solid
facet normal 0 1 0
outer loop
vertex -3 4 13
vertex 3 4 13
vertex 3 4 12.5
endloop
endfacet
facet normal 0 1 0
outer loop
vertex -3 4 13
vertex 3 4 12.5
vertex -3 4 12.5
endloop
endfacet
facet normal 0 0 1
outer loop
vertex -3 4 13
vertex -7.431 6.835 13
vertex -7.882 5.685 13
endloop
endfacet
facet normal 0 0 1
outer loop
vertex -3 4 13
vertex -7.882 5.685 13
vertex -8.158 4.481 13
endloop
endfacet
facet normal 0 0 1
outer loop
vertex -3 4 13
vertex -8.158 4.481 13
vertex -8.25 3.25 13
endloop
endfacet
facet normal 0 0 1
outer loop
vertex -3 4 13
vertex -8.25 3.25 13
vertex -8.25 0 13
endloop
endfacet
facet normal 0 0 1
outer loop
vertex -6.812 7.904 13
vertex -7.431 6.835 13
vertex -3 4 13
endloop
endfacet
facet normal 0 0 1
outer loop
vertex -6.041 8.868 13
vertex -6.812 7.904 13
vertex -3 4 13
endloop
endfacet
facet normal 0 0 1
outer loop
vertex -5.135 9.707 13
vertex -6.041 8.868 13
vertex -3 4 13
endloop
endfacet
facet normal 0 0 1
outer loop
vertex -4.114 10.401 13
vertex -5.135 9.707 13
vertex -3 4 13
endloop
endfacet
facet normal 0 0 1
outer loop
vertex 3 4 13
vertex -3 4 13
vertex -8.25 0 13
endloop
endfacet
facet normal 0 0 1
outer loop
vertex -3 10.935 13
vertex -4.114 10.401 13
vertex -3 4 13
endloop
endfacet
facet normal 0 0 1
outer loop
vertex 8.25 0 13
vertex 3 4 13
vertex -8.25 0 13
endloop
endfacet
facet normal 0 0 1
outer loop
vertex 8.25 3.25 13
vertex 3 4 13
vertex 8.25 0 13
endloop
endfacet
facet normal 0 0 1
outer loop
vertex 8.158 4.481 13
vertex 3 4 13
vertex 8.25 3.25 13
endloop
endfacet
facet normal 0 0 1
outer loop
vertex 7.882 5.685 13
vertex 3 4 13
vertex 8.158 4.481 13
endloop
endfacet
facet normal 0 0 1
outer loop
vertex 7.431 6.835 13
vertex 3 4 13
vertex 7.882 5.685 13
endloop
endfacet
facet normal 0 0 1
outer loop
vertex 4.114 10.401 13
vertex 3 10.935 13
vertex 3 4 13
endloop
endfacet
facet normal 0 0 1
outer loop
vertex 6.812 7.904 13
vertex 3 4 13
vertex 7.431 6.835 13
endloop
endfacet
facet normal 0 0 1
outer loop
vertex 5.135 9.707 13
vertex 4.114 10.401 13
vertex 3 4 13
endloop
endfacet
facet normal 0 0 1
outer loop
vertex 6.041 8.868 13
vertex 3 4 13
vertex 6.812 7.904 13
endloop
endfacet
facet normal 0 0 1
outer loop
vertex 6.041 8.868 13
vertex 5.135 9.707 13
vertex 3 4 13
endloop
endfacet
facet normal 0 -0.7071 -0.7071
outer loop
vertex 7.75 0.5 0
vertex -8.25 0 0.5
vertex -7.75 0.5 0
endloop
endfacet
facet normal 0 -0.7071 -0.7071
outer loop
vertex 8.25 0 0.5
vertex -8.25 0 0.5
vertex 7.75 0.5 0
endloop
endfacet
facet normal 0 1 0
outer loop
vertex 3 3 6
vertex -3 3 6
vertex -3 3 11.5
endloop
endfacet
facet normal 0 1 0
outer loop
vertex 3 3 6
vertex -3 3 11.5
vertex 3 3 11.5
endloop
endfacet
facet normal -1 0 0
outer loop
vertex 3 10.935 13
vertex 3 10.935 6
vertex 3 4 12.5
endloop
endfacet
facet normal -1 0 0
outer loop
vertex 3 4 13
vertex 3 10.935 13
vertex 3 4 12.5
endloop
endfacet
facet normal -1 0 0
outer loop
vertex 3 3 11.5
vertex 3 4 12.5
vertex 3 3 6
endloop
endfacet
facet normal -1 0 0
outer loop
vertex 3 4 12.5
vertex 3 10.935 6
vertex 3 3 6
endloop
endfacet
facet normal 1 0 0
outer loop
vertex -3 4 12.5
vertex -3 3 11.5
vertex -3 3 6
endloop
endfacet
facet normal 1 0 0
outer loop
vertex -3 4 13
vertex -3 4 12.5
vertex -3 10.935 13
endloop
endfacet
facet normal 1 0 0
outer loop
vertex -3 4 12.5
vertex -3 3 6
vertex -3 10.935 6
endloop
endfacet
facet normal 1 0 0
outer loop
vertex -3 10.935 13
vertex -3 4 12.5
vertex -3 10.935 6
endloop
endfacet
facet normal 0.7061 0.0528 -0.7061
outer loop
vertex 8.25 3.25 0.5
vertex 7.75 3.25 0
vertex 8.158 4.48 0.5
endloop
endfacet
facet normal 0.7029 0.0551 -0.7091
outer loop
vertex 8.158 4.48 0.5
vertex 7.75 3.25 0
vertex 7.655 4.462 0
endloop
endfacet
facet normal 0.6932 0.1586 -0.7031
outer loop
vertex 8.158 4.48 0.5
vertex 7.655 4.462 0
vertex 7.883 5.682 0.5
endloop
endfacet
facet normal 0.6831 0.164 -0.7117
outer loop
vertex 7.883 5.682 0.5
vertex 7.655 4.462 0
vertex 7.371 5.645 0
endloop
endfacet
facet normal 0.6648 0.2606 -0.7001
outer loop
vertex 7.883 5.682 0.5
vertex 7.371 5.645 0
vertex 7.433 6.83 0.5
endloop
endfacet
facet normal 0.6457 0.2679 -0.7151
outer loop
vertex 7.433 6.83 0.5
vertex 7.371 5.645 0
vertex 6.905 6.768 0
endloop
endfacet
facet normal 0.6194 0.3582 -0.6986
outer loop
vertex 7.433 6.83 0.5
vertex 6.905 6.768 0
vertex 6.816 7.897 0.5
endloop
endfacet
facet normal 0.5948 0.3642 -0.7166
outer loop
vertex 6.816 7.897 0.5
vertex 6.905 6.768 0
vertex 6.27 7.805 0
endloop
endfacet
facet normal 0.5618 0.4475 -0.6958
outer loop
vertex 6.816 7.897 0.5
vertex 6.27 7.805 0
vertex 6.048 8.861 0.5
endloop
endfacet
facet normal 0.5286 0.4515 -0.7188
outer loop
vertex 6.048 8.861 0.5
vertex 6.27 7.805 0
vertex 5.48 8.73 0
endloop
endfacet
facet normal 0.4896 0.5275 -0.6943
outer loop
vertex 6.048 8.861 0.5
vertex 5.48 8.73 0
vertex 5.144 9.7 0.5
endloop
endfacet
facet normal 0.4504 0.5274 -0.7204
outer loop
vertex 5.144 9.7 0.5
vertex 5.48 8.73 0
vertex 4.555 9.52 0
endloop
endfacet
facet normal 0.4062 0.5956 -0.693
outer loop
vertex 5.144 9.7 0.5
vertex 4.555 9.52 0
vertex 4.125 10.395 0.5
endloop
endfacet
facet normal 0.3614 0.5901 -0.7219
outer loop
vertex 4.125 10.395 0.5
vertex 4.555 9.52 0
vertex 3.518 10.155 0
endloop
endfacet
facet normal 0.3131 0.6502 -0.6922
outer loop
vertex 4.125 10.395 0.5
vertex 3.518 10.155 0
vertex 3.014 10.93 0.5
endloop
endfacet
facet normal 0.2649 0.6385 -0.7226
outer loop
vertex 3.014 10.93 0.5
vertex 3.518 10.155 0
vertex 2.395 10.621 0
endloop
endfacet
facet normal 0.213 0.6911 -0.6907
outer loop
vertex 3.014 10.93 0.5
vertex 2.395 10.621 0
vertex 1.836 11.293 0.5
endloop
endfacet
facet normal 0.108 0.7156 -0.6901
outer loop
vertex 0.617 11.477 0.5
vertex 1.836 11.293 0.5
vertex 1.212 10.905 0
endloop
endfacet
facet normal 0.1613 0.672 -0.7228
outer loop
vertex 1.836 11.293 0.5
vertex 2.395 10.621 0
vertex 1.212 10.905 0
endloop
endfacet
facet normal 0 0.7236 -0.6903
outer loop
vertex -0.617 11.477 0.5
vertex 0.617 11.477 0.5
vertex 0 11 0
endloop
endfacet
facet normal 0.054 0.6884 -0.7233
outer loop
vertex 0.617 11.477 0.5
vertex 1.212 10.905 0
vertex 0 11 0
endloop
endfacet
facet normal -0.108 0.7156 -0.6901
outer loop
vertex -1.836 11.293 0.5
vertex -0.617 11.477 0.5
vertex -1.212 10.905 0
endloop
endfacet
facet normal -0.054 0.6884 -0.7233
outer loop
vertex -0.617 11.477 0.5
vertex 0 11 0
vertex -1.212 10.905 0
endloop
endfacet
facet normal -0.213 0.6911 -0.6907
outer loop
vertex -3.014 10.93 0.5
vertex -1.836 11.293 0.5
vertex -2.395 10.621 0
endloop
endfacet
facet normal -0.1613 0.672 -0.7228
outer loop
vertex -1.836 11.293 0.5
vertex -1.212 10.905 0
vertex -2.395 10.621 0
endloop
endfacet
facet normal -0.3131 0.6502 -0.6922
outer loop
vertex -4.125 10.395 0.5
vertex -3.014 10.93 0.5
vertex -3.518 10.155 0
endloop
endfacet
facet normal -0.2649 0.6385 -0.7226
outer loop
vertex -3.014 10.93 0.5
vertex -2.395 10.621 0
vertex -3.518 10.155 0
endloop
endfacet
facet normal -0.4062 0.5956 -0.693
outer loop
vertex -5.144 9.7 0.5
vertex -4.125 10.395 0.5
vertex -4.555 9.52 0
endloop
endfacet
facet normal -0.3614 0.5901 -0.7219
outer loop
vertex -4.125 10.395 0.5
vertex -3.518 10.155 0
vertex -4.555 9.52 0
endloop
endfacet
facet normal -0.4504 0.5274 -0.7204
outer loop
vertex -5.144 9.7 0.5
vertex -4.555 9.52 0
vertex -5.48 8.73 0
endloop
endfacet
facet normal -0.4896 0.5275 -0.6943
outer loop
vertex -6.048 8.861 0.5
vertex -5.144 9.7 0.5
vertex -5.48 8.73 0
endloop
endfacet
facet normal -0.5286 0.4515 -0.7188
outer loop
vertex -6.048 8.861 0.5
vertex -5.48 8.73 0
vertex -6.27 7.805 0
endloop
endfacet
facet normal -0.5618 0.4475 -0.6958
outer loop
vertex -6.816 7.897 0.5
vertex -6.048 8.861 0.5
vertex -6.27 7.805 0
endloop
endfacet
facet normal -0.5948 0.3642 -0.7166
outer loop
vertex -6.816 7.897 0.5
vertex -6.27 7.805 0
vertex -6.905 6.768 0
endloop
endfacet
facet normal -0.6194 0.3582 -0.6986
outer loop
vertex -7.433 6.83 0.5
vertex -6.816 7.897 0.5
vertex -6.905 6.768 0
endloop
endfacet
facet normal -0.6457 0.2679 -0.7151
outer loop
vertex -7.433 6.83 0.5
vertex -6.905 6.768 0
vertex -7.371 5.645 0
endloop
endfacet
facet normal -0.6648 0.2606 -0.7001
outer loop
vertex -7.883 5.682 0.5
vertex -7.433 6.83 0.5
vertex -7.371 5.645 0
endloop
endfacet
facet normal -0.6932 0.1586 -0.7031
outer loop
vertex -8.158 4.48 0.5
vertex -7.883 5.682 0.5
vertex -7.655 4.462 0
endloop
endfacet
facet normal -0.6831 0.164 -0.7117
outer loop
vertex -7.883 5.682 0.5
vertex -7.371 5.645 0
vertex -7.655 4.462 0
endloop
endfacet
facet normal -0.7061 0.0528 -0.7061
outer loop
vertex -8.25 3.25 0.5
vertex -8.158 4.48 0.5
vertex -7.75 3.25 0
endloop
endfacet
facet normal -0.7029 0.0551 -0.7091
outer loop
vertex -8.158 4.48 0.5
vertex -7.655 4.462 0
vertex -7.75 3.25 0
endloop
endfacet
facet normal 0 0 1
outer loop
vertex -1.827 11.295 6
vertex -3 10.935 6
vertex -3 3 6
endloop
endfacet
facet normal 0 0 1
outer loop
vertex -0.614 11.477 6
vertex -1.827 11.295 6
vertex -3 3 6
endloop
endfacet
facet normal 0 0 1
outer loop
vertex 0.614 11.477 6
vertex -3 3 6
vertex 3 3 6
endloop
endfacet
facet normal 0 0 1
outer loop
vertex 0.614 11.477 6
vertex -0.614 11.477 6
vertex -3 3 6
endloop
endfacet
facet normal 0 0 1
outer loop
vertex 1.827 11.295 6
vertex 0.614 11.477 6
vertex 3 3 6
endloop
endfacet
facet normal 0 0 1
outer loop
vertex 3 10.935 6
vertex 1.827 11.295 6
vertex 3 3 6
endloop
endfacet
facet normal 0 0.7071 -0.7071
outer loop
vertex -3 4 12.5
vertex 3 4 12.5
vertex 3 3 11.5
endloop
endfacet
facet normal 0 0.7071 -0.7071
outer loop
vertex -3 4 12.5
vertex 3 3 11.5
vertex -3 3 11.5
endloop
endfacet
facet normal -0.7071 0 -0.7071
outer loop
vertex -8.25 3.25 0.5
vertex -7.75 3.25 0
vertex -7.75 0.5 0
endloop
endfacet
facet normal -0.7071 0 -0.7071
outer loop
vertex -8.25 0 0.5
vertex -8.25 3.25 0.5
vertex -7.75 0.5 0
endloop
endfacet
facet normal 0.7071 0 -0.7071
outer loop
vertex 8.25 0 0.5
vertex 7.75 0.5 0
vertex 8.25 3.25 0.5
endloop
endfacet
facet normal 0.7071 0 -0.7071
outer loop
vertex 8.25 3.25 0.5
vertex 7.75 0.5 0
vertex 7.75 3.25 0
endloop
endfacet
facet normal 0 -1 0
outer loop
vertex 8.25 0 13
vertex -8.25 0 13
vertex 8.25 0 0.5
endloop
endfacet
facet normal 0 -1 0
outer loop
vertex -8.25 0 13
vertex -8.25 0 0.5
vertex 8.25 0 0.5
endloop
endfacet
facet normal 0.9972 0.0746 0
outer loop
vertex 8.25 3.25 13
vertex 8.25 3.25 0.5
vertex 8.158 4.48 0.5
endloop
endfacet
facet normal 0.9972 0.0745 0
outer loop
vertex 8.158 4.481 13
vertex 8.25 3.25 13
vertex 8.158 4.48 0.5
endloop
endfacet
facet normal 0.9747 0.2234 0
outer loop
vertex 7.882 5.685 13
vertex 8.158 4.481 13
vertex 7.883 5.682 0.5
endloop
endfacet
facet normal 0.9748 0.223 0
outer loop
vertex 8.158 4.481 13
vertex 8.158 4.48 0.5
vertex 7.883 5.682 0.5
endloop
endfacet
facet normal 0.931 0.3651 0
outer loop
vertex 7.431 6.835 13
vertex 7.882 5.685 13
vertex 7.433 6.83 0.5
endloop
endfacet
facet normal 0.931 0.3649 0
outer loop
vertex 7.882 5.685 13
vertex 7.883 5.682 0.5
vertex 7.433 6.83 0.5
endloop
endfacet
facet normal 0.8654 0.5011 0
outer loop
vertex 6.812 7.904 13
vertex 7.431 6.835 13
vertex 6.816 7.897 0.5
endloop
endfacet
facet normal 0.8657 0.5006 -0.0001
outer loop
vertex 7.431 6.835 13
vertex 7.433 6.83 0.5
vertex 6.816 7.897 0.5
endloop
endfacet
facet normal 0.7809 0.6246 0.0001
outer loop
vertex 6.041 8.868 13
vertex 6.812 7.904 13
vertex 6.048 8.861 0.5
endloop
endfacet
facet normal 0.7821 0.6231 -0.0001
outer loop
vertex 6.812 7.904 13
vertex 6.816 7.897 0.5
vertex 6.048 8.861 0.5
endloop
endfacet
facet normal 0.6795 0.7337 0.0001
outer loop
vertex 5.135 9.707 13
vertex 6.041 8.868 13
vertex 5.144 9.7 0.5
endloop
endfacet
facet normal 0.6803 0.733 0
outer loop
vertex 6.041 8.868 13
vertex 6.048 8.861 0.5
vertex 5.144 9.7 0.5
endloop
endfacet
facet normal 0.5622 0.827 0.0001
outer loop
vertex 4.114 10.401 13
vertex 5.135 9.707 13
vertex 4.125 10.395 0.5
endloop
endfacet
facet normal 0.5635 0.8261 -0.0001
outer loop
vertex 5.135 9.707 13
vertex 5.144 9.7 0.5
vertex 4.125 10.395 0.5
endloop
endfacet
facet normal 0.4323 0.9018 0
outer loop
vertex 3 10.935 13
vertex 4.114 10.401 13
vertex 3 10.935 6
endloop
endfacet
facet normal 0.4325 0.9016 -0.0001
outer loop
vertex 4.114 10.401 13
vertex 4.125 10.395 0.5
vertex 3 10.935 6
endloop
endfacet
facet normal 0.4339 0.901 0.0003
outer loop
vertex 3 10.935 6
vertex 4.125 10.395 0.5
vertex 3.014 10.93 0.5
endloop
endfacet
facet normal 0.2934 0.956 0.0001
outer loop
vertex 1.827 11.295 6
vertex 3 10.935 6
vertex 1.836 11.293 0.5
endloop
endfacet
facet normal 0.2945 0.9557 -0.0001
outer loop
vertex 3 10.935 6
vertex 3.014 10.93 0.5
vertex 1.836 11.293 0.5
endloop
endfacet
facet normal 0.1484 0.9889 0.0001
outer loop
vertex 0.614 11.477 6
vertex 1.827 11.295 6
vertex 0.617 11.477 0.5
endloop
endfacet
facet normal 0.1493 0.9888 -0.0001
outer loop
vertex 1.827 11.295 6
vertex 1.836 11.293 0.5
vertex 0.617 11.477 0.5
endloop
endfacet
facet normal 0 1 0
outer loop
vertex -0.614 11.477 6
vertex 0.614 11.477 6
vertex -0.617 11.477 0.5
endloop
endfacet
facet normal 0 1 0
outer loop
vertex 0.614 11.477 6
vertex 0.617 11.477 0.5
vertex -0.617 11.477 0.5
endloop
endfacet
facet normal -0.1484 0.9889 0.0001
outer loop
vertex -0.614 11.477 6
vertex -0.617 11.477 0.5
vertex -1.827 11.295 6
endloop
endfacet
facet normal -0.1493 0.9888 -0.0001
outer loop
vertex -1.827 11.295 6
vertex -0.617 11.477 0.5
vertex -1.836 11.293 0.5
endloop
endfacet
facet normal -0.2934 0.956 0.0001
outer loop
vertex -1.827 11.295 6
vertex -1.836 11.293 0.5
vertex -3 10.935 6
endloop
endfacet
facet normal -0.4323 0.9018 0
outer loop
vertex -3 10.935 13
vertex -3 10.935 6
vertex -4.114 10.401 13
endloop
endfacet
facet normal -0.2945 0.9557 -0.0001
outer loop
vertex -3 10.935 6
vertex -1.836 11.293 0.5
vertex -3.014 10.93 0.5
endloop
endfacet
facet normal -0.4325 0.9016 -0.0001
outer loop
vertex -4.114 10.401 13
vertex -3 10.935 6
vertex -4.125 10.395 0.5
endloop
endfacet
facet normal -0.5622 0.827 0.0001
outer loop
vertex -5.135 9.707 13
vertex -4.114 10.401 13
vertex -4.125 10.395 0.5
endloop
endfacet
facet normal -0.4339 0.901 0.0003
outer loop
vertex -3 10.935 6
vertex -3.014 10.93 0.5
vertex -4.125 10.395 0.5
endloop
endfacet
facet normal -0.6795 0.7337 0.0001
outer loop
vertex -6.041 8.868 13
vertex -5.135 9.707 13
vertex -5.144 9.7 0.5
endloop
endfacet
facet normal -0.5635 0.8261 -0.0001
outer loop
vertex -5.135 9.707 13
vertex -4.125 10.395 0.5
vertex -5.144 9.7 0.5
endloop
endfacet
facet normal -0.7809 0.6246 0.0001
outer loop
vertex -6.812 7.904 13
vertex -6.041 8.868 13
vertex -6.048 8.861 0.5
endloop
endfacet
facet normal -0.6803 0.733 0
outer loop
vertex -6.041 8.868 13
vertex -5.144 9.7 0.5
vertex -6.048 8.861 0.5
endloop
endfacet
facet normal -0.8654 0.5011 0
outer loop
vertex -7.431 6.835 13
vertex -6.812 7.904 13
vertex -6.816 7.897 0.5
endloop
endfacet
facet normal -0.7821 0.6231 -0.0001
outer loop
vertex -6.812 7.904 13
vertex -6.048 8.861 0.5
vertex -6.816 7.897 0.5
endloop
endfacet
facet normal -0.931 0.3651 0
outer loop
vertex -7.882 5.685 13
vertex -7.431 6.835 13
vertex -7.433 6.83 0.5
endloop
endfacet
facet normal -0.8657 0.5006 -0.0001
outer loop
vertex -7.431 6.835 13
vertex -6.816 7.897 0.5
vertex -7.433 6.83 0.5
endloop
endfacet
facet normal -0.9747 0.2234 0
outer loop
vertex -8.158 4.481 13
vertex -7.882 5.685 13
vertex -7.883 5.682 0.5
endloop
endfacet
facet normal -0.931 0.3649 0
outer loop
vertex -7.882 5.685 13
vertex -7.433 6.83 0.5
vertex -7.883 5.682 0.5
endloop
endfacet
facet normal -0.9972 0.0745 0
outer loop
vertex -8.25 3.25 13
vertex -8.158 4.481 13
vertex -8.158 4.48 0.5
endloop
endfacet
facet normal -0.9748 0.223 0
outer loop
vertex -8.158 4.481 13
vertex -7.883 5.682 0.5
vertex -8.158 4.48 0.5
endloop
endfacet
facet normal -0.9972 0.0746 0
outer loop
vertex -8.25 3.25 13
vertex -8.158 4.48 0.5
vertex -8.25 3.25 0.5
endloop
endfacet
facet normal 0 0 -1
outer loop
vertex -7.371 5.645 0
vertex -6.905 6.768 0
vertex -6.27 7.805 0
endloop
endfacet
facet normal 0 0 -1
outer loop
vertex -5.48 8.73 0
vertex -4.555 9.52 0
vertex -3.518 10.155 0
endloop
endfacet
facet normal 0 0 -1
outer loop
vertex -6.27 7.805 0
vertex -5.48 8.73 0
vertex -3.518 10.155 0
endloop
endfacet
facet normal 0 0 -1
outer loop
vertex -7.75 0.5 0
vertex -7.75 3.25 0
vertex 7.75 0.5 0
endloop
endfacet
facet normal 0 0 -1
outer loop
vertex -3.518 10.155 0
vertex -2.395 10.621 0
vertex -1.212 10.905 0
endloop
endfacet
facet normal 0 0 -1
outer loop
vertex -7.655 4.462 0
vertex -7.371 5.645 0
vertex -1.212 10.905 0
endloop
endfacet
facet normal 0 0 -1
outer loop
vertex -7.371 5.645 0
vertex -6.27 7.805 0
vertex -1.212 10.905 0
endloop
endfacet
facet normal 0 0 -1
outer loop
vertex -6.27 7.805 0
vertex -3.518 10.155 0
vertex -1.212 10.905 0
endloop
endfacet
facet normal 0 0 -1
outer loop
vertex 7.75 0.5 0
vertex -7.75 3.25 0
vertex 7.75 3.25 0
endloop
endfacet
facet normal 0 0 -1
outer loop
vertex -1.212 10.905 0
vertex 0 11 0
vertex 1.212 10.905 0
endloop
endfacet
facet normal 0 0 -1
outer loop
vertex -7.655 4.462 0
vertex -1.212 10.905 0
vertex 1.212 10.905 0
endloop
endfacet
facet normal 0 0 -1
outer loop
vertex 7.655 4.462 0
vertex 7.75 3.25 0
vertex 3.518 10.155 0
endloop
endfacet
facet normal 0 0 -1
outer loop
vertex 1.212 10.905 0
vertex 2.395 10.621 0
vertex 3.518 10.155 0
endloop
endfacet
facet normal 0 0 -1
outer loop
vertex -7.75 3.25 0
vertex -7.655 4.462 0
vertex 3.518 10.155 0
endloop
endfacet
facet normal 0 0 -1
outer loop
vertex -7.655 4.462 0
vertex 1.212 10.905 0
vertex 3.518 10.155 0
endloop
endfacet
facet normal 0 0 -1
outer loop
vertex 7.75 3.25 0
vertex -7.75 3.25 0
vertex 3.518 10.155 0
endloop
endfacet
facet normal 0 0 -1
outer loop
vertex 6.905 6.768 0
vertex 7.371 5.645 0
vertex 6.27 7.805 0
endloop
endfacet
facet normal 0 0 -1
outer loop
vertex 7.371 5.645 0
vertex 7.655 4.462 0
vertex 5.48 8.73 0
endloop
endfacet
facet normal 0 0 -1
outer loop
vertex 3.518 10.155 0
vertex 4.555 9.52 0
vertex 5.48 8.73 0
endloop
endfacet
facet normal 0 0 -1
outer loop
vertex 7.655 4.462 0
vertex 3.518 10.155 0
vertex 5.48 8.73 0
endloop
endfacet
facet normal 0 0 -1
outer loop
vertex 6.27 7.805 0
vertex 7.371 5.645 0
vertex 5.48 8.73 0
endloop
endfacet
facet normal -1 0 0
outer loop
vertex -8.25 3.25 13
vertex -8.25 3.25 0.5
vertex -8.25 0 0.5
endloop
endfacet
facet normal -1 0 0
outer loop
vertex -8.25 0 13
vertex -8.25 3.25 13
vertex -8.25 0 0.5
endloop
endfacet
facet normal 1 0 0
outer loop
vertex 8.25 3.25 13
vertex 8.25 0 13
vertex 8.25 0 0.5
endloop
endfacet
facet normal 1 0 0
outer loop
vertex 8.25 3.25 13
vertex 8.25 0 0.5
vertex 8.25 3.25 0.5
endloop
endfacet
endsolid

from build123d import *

# Parameters (mm, degrees)
F4_DEPTH  = 1
F6_DEPTH  = 12
F7_SIZE   = 0.5
F8_W      = 6
F8_H      = 3
F9_DEPTH  = 12
F10_DEPTH = 5
F11_W     = 6
F11_H     = 1.5
F12_DEPTH = 1
F13_SIZE  = 0.99999


# Not quite as in the source:
# - a fillet or chamfer is up to 0.001 mm smaller than in the source, because OpenCascade refuses the exact size


with BuildPart() as f4:
    # F3 (on Top) → F4 (new body)
    with BuildSketch(Plane.XY):
        with BuildLine():
            Line((-8.25, 0), (0, 0))
            Line((0, 0), (8.25, 0))
            Line((8.25, 0), (8.25, 3.25))
            ThreePointArc((8.25, 3.25), (0, 11.5), (-8.25, 3.25))
            Line((-8.25, 3.25), (-8.25, 0))
        make_face()
    extrude(amount=F4_DEPTH)

    # F5 (on face) → F6 (join)
    with BuildSketch(Plane.XY.offset(1)):
        with BuildLine():
            Line((-3, 0), (-3, 10.9352130745))
            ThreePointArc((-3, 10.9352130745), (-6.8122132967, 7.9036276172), (-8.25, 3.25))
            Line((-8.25, 3.25), (-8.25, 0))
            Line((-8.25, 0), (-3, 0))
        make_face()
        with BuildLine():
            ThreePointArc((8.25, 3.25), (6.8122132967, 7.9036276172), (3, 10.9352130745))
            Line((3, 10.9352130745), (3, 0))
            Line((3, 0), (8.25, 0))
            Line((8.25, 0), (8.25, 3.25))
        make_face()
    extrude(amount=F6_DEPTH)

    # F7
    f7_edges = [f4.edges().sort_by_distance(p)[0] for p in [
        (8.25, 1.625, 0),
        (0, 0, 0),
    ]]
    chamfer(f7_edges, length=F7_SIZE)

    # F8 (on face) → F9 (join)
    with BuildSketch(Plane.XY.offset(1)):
        with Locations((0, 1.5)):
            Rectangle(F8_W, F8_H)
    extrude(amount=F9_DEPTH)

    # F10 (add): a face of the model
    f10_faces = [f4.faces().sort_by_distance(p)[0] for p in [
        (0, 7.1588841066, 1),
    ]]
    extrude(f10_faces, amount=F10_DEPTH)

    # F11 (on face) → F12 (join)
    with BuildSketch(Plane(origin=(0, 3, 0), x_dir=(-1, 0, 0), z_dir=(0, 1, 0))):
        with Locations((0, 12.25)):
            Rectangle(F11_W, F11_H)
    extrude(amount=F12_DEPTH)

    # F13 (size 1 in the source; OpenCascade refuses exactly that, so slightly less here)
    f13_edges = [f4.edges().sort_by_distance(p)[0] for p in [
        (0, 4, 11.5),
    ]]
    chamfer(f13_edges, length=F13_SIZE)


solid = f4.part
